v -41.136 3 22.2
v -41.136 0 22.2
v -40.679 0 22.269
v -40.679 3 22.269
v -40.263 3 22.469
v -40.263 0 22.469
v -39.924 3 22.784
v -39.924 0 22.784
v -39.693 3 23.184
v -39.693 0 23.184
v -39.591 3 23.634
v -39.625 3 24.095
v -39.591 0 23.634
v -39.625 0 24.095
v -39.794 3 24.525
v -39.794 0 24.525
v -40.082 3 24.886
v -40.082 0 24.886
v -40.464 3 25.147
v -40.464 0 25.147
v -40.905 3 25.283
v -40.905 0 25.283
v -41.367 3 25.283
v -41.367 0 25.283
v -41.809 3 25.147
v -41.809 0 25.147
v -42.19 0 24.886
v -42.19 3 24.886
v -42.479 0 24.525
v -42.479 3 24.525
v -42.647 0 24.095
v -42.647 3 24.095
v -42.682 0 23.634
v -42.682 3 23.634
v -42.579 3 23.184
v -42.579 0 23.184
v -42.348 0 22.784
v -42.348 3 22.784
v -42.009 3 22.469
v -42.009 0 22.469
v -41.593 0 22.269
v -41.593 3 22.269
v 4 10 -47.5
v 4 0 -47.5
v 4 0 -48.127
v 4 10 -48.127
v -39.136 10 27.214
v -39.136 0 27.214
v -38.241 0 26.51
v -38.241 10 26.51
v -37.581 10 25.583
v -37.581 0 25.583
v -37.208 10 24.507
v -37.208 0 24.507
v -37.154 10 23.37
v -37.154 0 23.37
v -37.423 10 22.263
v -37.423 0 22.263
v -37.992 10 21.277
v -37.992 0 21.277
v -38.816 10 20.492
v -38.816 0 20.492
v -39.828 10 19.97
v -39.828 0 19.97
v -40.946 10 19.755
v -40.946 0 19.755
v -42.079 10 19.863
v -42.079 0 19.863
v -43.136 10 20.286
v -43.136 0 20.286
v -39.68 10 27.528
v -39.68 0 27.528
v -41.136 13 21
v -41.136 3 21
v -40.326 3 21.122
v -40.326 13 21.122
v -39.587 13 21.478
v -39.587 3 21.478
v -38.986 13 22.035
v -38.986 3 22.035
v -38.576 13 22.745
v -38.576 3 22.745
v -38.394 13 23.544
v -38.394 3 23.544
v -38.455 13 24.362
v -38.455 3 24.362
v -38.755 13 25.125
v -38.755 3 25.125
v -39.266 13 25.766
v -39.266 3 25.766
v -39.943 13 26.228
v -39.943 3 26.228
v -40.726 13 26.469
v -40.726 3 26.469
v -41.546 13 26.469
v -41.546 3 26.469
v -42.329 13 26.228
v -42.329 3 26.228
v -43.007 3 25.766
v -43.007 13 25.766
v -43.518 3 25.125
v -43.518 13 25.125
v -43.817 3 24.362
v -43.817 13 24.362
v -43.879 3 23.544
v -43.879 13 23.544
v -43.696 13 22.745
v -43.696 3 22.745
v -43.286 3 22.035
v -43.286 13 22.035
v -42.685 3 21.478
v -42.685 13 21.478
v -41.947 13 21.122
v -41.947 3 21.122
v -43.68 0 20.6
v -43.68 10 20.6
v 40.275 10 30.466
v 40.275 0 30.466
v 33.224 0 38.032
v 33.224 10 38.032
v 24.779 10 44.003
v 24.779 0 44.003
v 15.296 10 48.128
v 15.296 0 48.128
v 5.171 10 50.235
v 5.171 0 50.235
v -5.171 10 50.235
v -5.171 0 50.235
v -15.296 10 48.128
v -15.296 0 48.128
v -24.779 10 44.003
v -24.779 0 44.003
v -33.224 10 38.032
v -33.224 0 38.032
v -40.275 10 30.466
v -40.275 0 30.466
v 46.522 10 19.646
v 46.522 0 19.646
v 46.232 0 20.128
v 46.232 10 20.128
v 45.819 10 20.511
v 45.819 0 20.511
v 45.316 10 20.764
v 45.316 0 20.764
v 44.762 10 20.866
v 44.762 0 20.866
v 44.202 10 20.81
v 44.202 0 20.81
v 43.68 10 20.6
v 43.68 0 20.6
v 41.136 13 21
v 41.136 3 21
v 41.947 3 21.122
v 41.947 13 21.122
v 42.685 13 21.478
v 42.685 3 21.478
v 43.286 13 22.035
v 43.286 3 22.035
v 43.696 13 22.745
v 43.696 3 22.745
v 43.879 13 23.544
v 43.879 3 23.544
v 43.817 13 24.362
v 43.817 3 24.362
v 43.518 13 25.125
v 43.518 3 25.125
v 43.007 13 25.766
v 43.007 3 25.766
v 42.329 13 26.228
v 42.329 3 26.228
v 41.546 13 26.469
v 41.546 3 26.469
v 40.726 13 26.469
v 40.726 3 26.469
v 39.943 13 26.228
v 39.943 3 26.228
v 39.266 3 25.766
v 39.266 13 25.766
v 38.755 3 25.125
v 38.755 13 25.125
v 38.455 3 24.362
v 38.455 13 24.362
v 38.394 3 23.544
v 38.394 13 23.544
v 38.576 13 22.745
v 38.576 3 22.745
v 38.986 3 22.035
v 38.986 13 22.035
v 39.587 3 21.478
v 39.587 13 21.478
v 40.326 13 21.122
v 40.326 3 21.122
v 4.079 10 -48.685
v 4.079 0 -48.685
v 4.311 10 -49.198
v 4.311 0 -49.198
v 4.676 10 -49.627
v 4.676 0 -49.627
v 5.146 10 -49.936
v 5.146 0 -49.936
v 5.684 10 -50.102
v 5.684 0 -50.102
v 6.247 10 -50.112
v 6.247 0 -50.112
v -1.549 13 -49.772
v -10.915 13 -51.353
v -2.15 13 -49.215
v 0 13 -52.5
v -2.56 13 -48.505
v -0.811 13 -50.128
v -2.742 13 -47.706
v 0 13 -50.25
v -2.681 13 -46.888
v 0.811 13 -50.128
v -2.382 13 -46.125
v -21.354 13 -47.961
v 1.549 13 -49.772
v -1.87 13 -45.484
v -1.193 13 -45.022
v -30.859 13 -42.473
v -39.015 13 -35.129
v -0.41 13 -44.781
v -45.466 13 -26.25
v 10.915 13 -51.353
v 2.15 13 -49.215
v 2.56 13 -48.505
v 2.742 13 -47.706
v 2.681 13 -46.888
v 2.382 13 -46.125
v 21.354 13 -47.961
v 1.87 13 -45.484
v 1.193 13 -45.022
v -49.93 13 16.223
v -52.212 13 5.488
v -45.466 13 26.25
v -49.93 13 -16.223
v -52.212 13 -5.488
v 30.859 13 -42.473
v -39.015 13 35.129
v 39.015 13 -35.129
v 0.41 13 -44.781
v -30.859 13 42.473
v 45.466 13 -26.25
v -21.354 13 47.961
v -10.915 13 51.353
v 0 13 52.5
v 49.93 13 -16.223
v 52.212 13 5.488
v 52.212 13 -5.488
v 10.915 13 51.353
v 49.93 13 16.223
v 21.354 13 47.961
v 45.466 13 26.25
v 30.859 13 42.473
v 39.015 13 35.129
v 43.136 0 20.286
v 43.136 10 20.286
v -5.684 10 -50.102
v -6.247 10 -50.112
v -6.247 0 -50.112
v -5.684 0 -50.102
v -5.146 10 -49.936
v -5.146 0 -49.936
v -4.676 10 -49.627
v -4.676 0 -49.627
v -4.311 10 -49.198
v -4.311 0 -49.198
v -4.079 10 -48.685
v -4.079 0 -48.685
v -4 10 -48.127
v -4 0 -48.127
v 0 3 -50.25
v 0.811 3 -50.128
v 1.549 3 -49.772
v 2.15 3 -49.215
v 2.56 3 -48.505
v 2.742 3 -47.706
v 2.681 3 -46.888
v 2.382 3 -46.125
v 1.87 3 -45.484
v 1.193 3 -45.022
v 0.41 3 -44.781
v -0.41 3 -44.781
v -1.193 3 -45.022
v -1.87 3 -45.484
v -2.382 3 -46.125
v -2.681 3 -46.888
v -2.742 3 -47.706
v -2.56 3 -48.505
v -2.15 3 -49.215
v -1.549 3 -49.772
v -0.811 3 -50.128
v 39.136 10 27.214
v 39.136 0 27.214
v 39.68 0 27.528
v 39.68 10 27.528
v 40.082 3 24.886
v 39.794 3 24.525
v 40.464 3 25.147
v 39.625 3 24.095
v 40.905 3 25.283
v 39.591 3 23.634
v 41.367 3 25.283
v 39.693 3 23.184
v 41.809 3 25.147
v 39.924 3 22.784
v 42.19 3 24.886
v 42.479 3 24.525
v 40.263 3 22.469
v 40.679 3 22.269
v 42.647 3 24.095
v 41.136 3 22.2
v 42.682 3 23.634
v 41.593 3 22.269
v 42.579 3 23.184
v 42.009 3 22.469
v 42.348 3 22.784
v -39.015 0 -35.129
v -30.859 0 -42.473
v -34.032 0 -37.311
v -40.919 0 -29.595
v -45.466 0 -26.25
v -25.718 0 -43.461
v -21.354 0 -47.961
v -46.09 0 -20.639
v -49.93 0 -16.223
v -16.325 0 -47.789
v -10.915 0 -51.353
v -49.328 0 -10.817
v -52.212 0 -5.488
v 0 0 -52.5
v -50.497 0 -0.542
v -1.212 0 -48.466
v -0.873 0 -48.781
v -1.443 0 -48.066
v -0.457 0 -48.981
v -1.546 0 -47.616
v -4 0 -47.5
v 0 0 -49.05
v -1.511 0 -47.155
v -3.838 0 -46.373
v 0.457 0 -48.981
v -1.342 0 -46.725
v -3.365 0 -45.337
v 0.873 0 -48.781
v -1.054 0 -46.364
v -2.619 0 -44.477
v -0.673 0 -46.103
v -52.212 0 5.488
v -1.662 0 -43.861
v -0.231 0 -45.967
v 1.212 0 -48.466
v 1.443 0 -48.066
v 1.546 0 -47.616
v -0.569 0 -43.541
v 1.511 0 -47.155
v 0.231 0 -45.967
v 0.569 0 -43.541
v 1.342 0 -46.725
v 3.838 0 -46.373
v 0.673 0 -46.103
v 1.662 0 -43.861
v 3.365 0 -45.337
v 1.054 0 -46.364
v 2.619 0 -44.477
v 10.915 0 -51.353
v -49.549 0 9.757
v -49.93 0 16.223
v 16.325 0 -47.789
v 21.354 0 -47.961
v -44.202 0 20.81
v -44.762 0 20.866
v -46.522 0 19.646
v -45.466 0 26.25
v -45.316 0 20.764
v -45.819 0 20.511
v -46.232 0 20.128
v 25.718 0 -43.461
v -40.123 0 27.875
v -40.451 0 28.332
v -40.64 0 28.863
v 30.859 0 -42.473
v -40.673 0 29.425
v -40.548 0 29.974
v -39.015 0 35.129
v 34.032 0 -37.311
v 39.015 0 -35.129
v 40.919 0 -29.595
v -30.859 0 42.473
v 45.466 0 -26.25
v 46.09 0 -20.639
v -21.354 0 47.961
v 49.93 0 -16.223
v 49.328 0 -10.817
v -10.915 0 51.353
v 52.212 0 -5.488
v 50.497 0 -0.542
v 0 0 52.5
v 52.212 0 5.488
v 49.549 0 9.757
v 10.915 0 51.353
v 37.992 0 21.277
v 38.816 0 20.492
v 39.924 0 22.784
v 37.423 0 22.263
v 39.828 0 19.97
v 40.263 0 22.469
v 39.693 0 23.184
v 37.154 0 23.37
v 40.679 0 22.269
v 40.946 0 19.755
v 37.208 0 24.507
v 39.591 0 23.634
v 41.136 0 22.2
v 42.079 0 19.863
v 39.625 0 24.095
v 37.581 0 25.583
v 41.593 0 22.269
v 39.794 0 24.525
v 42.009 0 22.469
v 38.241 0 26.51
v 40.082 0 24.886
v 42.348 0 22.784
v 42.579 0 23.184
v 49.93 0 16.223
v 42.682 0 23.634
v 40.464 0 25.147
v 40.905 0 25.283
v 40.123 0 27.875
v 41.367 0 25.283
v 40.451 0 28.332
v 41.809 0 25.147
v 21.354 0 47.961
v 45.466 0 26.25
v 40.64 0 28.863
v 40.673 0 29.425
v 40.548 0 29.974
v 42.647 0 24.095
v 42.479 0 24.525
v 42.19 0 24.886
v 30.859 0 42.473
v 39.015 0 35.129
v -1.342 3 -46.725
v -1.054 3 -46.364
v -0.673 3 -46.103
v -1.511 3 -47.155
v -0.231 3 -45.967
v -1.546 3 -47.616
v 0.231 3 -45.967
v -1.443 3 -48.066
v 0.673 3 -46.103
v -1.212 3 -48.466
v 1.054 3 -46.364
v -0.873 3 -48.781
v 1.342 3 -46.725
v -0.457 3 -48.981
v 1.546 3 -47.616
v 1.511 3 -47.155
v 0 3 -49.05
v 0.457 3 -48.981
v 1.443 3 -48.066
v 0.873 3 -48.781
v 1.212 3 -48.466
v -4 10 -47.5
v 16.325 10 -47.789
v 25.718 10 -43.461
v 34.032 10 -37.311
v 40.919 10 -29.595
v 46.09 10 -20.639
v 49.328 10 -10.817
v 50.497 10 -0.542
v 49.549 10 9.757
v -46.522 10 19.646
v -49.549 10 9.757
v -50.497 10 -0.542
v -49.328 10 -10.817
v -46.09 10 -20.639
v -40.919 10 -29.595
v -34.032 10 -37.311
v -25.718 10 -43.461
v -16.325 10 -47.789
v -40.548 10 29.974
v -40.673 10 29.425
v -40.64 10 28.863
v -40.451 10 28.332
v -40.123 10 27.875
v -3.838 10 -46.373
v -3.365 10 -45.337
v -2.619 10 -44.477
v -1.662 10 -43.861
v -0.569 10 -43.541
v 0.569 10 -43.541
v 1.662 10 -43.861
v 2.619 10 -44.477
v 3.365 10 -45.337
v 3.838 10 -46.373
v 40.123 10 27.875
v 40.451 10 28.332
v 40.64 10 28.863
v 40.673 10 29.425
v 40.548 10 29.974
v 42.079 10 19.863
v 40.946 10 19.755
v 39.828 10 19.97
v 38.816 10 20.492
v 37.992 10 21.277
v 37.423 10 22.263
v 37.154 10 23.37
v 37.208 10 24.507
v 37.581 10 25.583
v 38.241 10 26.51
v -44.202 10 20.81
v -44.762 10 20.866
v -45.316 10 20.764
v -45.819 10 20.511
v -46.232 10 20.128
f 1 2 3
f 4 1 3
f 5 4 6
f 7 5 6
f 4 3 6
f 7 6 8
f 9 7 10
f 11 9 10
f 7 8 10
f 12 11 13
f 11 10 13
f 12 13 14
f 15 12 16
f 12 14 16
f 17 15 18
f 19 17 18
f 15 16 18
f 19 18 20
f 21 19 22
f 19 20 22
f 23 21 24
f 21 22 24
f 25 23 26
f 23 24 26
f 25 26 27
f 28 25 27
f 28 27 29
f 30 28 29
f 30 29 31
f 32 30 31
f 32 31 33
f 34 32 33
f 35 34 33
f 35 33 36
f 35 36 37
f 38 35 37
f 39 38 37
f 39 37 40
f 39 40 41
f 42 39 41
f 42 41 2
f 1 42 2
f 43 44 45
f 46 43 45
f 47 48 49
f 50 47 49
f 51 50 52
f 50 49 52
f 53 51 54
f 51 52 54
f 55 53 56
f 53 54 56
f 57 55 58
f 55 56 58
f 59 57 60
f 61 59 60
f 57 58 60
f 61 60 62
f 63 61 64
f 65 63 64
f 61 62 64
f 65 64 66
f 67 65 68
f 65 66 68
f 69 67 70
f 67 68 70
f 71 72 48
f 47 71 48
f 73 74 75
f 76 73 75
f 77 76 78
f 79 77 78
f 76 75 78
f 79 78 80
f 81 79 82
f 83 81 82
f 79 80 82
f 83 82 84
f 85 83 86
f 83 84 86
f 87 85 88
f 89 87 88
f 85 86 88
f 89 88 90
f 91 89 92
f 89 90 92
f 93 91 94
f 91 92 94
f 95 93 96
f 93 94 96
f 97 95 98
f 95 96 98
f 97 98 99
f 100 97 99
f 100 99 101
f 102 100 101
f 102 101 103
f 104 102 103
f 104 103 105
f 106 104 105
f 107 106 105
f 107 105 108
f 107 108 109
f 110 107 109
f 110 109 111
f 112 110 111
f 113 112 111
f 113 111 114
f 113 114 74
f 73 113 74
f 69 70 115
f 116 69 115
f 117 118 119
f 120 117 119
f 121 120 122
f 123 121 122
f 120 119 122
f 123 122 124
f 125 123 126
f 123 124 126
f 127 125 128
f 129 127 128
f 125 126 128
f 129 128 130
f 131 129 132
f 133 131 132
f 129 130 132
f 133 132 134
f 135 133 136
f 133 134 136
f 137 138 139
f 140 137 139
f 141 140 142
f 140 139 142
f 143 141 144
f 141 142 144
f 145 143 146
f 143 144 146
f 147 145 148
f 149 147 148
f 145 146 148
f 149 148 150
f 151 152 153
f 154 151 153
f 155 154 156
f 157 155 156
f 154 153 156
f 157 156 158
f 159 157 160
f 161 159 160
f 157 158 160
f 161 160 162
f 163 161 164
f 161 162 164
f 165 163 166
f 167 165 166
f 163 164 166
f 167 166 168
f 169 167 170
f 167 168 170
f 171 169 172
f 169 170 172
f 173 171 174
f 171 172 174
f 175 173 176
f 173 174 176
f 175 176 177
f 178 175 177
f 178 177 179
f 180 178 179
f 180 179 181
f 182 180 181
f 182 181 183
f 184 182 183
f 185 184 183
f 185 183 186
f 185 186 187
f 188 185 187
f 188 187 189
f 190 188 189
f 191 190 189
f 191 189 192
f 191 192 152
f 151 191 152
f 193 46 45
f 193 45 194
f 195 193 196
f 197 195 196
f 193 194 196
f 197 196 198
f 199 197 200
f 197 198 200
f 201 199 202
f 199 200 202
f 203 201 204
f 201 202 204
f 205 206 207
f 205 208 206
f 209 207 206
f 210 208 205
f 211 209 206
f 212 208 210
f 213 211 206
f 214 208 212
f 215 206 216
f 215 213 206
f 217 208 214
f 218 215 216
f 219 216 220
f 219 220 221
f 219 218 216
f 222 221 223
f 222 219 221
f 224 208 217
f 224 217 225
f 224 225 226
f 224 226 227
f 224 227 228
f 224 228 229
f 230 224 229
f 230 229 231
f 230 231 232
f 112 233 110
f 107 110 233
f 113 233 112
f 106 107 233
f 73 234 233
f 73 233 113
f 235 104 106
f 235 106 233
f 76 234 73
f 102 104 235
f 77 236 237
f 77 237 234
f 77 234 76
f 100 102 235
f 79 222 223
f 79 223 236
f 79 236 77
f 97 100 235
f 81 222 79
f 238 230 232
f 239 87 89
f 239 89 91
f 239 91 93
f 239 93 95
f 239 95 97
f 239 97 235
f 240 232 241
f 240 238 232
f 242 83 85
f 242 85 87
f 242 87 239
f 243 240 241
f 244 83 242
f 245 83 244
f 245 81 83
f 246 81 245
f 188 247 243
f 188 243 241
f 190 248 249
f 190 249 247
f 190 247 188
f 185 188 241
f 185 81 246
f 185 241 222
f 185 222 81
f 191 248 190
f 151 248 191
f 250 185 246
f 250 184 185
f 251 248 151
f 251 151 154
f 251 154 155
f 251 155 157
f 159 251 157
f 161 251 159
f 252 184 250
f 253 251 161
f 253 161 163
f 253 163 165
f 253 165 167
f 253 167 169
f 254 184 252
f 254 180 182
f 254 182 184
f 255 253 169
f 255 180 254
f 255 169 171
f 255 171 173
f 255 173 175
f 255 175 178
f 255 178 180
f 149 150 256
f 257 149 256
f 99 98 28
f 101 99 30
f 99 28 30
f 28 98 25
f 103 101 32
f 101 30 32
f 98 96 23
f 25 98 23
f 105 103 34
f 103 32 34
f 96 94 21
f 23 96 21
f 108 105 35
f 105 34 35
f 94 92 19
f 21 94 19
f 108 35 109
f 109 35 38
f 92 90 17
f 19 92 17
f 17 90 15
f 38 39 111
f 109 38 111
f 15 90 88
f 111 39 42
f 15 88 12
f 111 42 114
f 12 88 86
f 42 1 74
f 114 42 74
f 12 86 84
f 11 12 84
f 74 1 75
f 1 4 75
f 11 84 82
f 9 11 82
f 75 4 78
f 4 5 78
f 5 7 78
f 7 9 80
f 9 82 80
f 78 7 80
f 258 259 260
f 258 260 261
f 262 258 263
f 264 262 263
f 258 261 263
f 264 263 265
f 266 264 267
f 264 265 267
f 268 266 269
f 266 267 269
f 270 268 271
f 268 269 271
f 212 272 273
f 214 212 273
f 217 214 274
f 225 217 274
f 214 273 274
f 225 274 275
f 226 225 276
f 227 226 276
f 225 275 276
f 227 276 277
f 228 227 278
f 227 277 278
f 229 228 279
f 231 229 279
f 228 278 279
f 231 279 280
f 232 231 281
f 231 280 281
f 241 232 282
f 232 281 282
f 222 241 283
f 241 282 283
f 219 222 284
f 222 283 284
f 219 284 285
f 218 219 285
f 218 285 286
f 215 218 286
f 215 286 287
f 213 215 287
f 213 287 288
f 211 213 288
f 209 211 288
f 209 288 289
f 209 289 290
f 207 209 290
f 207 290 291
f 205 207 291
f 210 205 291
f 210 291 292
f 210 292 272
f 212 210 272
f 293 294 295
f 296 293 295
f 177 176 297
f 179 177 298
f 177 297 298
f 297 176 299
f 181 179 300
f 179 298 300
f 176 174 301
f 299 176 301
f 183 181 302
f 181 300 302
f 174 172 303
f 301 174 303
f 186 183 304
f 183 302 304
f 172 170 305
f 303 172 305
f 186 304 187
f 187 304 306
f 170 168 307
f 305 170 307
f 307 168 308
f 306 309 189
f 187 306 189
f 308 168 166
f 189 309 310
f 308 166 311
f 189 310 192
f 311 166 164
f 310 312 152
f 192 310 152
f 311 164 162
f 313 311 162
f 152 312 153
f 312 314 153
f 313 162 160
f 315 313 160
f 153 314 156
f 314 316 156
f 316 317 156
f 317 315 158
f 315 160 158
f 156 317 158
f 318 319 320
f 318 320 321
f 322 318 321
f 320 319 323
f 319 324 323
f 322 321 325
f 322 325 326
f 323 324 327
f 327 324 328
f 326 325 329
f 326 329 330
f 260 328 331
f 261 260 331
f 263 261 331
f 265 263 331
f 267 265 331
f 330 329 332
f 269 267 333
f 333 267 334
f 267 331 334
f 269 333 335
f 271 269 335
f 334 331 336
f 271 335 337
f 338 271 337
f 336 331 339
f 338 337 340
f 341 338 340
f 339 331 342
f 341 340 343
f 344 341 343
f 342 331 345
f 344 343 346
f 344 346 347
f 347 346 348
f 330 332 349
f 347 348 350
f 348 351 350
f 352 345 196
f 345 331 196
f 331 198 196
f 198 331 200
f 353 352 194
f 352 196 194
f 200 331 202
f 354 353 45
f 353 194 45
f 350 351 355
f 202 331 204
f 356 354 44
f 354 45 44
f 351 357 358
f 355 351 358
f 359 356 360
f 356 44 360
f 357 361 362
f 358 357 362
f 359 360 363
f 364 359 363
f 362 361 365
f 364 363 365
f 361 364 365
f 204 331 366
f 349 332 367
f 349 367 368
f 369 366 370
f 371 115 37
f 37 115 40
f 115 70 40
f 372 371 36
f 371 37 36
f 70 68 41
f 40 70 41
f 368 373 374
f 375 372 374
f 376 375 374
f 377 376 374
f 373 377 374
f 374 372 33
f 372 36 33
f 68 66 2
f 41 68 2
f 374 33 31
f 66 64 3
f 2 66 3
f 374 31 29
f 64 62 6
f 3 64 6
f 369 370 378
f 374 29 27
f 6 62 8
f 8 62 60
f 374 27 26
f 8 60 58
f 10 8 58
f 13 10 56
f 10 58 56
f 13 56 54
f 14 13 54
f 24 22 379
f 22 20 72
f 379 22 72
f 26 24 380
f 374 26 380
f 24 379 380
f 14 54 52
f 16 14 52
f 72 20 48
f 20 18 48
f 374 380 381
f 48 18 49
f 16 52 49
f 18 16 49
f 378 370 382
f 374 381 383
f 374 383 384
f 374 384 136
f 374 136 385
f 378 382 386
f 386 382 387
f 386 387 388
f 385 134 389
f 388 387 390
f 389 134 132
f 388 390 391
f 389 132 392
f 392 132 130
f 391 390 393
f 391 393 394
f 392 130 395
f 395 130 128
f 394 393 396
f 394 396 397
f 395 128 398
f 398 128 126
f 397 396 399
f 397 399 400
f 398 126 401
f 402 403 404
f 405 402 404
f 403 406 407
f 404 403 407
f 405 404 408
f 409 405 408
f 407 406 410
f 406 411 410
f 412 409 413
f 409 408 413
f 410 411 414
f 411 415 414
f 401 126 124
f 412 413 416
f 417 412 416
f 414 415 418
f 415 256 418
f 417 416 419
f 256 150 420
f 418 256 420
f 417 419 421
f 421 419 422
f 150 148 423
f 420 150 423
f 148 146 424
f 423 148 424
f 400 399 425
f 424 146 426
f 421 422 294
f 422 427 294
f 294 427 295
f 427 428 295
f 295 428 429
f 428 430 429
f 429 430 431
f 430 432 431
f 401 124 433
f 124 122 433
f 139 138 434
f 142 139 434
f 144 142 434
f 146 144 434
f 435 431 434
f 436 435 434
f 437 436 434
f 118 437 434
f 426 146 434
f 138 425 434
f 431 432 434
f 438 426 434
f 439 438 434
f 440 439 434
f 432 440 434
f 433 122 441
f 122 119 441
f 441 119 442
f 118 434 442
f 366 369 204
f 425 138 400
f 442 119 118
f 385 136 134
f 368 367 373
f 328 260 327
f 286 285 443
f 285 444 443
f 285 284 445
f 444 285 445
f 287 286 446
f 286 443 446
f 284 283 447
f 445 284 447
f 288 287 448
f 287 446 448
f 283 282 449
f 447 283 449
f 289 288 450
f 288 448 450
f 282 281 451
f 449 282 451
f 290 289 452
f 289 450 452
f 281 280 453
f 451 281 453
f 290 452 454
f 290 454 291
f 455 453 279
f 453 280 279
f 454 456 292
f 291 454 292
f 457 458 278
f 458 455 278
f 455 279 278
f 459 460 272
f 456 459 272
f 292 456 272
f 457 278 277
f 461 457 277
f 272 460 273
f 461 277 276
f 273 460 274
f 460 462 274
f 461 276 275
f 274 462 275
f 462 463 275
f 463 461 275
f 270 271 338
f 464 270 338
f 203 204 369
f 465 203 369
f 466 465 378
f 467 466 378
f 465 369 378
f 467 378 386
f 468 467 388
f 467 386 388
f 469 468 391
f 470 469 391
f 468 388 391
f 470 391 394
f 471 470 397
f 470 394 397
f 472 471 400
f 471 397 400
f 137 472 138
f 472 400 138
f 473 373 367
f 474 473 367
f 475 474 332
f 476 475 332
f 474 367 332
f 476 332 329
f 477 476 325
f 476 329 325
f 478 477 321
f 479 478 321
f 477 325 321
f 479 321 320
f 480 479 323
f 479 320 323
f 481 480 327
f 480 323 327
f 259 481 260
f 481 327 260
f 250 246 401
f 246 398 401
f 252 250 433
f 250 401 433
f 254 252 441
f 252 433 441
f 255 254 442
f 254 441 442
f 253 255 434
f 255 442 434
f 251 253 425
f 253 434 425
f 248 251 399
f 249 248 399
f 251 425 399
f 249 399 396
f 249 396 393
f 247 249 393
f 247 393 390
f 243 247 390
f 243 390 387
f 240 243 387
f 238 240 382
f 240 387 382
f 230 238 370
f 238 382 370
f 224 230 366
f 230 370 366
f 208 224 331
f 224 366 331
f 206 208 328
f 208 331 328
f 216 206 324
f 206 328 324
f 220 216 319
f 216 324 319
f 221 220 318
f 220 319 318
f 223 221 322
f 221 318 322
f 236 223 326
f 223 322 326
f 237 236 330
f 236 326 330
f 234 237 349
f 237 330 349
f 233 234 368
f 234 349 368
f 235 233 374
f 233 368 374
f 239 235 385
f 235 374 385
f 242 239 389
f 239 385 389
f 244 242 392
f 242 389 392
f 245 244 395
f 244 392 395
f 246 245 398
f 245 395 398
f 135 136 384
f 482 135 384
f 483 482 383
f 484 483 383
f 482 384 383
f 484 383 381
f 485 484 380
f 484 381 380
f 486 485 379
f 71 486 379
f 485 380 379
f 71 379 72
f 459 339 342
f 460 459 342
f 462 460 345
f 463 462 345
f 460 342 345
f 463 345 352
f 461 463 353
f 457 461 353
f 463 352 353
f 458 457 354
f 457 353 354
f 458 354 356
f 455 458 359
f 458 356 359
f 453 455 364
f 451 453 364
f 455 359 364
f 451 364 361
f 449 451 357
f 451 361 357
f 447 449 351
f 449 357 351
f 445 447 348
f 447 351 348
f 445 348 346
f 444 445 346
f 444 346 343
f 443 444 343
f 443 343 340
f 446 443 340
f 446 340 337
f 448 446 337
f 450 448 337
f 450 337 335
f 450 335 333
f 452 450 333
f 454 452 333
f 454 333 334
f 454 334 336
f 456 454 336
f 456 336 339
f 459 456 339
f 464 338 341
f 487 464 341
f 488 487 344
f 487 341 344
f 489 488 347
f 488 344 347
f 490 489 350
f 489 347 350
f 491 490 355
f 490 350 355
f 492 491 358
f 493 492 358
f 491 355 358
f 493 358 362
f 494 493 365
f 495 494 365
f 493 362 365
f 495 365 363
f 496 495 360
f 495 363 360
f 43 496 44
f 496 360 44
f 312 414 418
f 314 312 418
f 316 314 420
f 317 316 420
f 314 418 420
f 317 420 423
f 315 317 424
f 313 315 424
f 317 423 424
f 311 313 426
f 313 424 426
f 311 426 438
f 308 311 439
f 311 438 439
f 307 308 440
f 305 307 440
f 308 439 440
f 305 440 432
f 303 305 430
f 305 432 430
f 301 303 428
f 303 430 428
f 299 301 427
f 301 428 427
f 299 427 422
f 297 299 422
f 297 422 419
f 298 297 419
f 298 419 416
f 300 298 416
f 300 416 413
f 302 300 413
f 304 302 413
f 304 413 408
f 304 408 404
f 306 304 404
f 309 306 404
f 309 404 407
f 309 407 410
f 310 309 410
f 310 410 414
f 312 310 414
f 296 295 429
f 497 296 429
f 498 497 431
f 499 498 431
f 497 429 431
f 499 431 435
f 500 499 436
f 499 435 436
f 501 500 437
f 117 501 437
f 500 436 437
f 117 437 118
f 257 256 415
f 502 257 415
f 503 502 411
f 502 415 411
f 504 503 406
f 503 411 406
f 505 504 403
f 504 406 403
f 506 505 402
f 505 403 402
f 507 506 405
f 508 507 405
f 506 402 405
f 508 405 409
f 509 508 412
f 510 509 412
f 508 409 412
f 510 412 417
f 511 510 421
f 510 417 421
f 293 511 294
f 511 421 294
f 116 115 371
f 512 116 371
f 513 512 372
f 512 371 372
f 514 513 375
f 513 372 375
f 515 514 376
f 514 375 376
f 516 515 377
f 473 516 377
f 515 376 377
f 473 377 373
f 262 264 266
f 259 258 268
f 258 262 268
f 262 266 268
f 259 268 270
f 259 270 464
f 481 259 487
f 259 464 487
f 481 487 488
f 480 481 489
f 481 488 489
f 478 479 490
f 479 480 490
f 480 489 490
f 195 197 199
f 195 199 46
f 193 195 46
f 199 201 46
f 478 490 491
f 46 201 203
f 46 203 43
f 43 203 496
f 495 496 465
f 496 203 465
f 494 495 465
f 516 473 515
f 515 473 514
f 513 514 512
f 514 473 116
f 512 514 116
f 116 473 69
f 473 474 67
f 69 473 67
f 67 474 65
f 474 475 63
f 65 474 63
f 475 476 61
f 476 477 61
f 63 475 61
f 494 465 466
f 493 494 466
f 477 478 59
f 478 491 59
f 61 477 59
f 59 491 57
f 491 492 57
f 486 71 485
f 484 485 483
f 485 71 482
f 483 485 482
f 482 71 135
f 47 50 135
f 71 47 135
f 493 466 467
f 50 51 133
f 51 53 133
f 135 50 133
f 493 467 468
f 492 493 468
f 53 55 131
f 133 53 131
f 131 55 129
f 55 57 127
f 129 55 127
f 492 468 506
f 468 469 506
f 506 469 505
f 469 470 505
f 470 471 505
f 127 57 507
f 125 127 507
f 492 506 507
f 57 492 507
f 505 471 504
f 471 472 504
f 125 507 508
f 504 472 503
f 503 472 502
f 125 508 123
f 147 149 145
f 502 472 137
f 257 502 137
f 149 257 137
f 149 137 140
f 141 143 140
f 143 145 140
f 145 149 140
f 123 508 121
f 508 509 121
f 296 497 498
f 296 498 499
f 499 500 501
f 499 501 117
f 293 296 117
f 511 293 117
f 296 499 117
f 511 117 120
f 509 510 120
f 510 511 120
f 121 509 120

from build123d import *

# Parameters (mm, degrees)
ESQUISSE1_R             = 52.5
BOSS_EXTRU_1_DEPTH      = 10
ESQUISSE2_R             = 52.5
BOSS_EXTRU_2_DEPTH      = 3
ENL_V_START             = -3
ESQUISSE3_R             = 2.75
ENL_V_MAT_EXTRU_2_DEPTH = 73.375725535
ESQUISSE4_R             = 1.55
ENL_V_MAT_EXTRU_3_DEPTH = 76.375725535


with BuildPart() as part:
    # Esquisse1 → Boss.-Extru.1 (new body)
    with BuildSketch(Plane(origin=(0, 0, 0), x_dir=(1, 0, 0), z_dir=(0, 1, 0))):
        with Locations(Location((0, 0, 0), (0, 0, 270))):
            Circle(ESQUISSE1_R)
        with BuildLine():
            ThreePointArc((-4, 47.5), (0, 43.5), (4, 47.5))
            Line((4, 47.5), (4, 48.127435003))
            ThreePointArc((4, 48.127435003), (4.676150568, 49.626575651), (6.24742268, 50.112071498))
            ThreePointArc((6.24742268, 50.112071498), (43.734282891, 25.25), (46.522038294, -19.645609))
            ThreePointArc((46.522038294, -19.645609), (45.3159505, -20.763622642), (43.679581332, -20.599615887))
            Line((43.679581332, -20.599615887), (43.13620668, -20.285898385))
            ThreePointArc((43.13620668, -20.285898385), (37.672105065, -21.75), (39.13620668, -27.214101615))
            Line((39.13620668, -27.214101615), (39.679581332, -27.527819117))
            ThreePointArc((39.679581332, -27.527819117), (40.639799932, -28.862953009), (40.274615614, -30.466462499))
            ThreePointArc((40.274615614, -30.466462499), (0, -50.5), (-40.274615614, -30.466462499))
            ThreePointArc((-40.274615614, -30.466462499), (-40.639799932, -28.862953009), (-39.679581332, -27.527819117))
            Line((-39.679581332, -27.527819117), (-39.13620668, -27.214101615))
            ThreePointArc((-39.13620668, -27.214101615), (-37.672105065, -21.75), (-43.13620668, -20.285898385))
            Line((-43.13620668, -20.285898385), (-43.679581332, -20.599615887))
            ThreePointArc((-43.679581332, -20.599615887), (-45.3159505, -20.763622642), (-46.522038294, -19.645609))
            ThreePointArc((-46.522038294, -19.645609), (-43.734282891, 25.25), (-6.24742268, 50.112071498))
            ThreePointArc((-6.24742268, 50.112071498), (-4.676150568, 49.626575651), (-4, 48.127435003))
            Line((-4, 48.127435003), (-4, 47.5))
        make_face(mode=Mode.SUBTRACT)
    extrude(amount=BOSS_EXTRU_1_DEPTH)

    # Esquisse2 → Boss.-Extru.2 (add)
    with BuildSketch(Plane(origin=(0, 10, 0), x_dir=(1, 0, 0), z_dir=(0, 1, 0))):
        with Locations(Location((0, 0, 0), (0, 0, 270))):
            Circle(ESQUISSE2_R)
    extrude(amount=BOSS_EXTRU_2_DEPTH)

    # Esquisse3 → Enlèv. mat.-Extru.2 (cut, through all)
    with BuildSketch(Plane.XZ.offset(ENL_V_START)):
        with Locations(Location((0, -47.5, 0), (0, 0, 270))):
            Circle(ESQUISSE3_R)
        with Locations(Location((-41.13620668, 23.75, 0), (0, 0, 270))):
            Circle(ESQUISSE3_R)
        with Locations(Location((41.13620668, 23.75, 0), (0, 0, 270))):
            Circle(ESQUISSE3_R)
    extrude(amount=-ENL_V_MAT_EXTRU_2_DEPTH, mode=Mode.SUBTRACT)

    # Esquisse4 → Enlèv. mat.-Extru.3 (cut, through all)
    with BuildSketch(Plane.XZ):
        with Locations(Location((0, -47.5, 0), (0, 0, 270))):
            Circle(ESQUISSE4_R)
        with Locations(Location((-41.13620668, 23.75, 0), (0, 0, 270))):
            Circle(ESQUISSE4_R)
        with Locations(Location((41.13620668, 23.75, 0), (0, 0, 270))):
            Circle(ESQUISSE4_R)
    extrude(amount=-ENL_V_MAT_EXTRU_3_DEPTH, mode=Mode.SUBTRACT)


solid = part.part
